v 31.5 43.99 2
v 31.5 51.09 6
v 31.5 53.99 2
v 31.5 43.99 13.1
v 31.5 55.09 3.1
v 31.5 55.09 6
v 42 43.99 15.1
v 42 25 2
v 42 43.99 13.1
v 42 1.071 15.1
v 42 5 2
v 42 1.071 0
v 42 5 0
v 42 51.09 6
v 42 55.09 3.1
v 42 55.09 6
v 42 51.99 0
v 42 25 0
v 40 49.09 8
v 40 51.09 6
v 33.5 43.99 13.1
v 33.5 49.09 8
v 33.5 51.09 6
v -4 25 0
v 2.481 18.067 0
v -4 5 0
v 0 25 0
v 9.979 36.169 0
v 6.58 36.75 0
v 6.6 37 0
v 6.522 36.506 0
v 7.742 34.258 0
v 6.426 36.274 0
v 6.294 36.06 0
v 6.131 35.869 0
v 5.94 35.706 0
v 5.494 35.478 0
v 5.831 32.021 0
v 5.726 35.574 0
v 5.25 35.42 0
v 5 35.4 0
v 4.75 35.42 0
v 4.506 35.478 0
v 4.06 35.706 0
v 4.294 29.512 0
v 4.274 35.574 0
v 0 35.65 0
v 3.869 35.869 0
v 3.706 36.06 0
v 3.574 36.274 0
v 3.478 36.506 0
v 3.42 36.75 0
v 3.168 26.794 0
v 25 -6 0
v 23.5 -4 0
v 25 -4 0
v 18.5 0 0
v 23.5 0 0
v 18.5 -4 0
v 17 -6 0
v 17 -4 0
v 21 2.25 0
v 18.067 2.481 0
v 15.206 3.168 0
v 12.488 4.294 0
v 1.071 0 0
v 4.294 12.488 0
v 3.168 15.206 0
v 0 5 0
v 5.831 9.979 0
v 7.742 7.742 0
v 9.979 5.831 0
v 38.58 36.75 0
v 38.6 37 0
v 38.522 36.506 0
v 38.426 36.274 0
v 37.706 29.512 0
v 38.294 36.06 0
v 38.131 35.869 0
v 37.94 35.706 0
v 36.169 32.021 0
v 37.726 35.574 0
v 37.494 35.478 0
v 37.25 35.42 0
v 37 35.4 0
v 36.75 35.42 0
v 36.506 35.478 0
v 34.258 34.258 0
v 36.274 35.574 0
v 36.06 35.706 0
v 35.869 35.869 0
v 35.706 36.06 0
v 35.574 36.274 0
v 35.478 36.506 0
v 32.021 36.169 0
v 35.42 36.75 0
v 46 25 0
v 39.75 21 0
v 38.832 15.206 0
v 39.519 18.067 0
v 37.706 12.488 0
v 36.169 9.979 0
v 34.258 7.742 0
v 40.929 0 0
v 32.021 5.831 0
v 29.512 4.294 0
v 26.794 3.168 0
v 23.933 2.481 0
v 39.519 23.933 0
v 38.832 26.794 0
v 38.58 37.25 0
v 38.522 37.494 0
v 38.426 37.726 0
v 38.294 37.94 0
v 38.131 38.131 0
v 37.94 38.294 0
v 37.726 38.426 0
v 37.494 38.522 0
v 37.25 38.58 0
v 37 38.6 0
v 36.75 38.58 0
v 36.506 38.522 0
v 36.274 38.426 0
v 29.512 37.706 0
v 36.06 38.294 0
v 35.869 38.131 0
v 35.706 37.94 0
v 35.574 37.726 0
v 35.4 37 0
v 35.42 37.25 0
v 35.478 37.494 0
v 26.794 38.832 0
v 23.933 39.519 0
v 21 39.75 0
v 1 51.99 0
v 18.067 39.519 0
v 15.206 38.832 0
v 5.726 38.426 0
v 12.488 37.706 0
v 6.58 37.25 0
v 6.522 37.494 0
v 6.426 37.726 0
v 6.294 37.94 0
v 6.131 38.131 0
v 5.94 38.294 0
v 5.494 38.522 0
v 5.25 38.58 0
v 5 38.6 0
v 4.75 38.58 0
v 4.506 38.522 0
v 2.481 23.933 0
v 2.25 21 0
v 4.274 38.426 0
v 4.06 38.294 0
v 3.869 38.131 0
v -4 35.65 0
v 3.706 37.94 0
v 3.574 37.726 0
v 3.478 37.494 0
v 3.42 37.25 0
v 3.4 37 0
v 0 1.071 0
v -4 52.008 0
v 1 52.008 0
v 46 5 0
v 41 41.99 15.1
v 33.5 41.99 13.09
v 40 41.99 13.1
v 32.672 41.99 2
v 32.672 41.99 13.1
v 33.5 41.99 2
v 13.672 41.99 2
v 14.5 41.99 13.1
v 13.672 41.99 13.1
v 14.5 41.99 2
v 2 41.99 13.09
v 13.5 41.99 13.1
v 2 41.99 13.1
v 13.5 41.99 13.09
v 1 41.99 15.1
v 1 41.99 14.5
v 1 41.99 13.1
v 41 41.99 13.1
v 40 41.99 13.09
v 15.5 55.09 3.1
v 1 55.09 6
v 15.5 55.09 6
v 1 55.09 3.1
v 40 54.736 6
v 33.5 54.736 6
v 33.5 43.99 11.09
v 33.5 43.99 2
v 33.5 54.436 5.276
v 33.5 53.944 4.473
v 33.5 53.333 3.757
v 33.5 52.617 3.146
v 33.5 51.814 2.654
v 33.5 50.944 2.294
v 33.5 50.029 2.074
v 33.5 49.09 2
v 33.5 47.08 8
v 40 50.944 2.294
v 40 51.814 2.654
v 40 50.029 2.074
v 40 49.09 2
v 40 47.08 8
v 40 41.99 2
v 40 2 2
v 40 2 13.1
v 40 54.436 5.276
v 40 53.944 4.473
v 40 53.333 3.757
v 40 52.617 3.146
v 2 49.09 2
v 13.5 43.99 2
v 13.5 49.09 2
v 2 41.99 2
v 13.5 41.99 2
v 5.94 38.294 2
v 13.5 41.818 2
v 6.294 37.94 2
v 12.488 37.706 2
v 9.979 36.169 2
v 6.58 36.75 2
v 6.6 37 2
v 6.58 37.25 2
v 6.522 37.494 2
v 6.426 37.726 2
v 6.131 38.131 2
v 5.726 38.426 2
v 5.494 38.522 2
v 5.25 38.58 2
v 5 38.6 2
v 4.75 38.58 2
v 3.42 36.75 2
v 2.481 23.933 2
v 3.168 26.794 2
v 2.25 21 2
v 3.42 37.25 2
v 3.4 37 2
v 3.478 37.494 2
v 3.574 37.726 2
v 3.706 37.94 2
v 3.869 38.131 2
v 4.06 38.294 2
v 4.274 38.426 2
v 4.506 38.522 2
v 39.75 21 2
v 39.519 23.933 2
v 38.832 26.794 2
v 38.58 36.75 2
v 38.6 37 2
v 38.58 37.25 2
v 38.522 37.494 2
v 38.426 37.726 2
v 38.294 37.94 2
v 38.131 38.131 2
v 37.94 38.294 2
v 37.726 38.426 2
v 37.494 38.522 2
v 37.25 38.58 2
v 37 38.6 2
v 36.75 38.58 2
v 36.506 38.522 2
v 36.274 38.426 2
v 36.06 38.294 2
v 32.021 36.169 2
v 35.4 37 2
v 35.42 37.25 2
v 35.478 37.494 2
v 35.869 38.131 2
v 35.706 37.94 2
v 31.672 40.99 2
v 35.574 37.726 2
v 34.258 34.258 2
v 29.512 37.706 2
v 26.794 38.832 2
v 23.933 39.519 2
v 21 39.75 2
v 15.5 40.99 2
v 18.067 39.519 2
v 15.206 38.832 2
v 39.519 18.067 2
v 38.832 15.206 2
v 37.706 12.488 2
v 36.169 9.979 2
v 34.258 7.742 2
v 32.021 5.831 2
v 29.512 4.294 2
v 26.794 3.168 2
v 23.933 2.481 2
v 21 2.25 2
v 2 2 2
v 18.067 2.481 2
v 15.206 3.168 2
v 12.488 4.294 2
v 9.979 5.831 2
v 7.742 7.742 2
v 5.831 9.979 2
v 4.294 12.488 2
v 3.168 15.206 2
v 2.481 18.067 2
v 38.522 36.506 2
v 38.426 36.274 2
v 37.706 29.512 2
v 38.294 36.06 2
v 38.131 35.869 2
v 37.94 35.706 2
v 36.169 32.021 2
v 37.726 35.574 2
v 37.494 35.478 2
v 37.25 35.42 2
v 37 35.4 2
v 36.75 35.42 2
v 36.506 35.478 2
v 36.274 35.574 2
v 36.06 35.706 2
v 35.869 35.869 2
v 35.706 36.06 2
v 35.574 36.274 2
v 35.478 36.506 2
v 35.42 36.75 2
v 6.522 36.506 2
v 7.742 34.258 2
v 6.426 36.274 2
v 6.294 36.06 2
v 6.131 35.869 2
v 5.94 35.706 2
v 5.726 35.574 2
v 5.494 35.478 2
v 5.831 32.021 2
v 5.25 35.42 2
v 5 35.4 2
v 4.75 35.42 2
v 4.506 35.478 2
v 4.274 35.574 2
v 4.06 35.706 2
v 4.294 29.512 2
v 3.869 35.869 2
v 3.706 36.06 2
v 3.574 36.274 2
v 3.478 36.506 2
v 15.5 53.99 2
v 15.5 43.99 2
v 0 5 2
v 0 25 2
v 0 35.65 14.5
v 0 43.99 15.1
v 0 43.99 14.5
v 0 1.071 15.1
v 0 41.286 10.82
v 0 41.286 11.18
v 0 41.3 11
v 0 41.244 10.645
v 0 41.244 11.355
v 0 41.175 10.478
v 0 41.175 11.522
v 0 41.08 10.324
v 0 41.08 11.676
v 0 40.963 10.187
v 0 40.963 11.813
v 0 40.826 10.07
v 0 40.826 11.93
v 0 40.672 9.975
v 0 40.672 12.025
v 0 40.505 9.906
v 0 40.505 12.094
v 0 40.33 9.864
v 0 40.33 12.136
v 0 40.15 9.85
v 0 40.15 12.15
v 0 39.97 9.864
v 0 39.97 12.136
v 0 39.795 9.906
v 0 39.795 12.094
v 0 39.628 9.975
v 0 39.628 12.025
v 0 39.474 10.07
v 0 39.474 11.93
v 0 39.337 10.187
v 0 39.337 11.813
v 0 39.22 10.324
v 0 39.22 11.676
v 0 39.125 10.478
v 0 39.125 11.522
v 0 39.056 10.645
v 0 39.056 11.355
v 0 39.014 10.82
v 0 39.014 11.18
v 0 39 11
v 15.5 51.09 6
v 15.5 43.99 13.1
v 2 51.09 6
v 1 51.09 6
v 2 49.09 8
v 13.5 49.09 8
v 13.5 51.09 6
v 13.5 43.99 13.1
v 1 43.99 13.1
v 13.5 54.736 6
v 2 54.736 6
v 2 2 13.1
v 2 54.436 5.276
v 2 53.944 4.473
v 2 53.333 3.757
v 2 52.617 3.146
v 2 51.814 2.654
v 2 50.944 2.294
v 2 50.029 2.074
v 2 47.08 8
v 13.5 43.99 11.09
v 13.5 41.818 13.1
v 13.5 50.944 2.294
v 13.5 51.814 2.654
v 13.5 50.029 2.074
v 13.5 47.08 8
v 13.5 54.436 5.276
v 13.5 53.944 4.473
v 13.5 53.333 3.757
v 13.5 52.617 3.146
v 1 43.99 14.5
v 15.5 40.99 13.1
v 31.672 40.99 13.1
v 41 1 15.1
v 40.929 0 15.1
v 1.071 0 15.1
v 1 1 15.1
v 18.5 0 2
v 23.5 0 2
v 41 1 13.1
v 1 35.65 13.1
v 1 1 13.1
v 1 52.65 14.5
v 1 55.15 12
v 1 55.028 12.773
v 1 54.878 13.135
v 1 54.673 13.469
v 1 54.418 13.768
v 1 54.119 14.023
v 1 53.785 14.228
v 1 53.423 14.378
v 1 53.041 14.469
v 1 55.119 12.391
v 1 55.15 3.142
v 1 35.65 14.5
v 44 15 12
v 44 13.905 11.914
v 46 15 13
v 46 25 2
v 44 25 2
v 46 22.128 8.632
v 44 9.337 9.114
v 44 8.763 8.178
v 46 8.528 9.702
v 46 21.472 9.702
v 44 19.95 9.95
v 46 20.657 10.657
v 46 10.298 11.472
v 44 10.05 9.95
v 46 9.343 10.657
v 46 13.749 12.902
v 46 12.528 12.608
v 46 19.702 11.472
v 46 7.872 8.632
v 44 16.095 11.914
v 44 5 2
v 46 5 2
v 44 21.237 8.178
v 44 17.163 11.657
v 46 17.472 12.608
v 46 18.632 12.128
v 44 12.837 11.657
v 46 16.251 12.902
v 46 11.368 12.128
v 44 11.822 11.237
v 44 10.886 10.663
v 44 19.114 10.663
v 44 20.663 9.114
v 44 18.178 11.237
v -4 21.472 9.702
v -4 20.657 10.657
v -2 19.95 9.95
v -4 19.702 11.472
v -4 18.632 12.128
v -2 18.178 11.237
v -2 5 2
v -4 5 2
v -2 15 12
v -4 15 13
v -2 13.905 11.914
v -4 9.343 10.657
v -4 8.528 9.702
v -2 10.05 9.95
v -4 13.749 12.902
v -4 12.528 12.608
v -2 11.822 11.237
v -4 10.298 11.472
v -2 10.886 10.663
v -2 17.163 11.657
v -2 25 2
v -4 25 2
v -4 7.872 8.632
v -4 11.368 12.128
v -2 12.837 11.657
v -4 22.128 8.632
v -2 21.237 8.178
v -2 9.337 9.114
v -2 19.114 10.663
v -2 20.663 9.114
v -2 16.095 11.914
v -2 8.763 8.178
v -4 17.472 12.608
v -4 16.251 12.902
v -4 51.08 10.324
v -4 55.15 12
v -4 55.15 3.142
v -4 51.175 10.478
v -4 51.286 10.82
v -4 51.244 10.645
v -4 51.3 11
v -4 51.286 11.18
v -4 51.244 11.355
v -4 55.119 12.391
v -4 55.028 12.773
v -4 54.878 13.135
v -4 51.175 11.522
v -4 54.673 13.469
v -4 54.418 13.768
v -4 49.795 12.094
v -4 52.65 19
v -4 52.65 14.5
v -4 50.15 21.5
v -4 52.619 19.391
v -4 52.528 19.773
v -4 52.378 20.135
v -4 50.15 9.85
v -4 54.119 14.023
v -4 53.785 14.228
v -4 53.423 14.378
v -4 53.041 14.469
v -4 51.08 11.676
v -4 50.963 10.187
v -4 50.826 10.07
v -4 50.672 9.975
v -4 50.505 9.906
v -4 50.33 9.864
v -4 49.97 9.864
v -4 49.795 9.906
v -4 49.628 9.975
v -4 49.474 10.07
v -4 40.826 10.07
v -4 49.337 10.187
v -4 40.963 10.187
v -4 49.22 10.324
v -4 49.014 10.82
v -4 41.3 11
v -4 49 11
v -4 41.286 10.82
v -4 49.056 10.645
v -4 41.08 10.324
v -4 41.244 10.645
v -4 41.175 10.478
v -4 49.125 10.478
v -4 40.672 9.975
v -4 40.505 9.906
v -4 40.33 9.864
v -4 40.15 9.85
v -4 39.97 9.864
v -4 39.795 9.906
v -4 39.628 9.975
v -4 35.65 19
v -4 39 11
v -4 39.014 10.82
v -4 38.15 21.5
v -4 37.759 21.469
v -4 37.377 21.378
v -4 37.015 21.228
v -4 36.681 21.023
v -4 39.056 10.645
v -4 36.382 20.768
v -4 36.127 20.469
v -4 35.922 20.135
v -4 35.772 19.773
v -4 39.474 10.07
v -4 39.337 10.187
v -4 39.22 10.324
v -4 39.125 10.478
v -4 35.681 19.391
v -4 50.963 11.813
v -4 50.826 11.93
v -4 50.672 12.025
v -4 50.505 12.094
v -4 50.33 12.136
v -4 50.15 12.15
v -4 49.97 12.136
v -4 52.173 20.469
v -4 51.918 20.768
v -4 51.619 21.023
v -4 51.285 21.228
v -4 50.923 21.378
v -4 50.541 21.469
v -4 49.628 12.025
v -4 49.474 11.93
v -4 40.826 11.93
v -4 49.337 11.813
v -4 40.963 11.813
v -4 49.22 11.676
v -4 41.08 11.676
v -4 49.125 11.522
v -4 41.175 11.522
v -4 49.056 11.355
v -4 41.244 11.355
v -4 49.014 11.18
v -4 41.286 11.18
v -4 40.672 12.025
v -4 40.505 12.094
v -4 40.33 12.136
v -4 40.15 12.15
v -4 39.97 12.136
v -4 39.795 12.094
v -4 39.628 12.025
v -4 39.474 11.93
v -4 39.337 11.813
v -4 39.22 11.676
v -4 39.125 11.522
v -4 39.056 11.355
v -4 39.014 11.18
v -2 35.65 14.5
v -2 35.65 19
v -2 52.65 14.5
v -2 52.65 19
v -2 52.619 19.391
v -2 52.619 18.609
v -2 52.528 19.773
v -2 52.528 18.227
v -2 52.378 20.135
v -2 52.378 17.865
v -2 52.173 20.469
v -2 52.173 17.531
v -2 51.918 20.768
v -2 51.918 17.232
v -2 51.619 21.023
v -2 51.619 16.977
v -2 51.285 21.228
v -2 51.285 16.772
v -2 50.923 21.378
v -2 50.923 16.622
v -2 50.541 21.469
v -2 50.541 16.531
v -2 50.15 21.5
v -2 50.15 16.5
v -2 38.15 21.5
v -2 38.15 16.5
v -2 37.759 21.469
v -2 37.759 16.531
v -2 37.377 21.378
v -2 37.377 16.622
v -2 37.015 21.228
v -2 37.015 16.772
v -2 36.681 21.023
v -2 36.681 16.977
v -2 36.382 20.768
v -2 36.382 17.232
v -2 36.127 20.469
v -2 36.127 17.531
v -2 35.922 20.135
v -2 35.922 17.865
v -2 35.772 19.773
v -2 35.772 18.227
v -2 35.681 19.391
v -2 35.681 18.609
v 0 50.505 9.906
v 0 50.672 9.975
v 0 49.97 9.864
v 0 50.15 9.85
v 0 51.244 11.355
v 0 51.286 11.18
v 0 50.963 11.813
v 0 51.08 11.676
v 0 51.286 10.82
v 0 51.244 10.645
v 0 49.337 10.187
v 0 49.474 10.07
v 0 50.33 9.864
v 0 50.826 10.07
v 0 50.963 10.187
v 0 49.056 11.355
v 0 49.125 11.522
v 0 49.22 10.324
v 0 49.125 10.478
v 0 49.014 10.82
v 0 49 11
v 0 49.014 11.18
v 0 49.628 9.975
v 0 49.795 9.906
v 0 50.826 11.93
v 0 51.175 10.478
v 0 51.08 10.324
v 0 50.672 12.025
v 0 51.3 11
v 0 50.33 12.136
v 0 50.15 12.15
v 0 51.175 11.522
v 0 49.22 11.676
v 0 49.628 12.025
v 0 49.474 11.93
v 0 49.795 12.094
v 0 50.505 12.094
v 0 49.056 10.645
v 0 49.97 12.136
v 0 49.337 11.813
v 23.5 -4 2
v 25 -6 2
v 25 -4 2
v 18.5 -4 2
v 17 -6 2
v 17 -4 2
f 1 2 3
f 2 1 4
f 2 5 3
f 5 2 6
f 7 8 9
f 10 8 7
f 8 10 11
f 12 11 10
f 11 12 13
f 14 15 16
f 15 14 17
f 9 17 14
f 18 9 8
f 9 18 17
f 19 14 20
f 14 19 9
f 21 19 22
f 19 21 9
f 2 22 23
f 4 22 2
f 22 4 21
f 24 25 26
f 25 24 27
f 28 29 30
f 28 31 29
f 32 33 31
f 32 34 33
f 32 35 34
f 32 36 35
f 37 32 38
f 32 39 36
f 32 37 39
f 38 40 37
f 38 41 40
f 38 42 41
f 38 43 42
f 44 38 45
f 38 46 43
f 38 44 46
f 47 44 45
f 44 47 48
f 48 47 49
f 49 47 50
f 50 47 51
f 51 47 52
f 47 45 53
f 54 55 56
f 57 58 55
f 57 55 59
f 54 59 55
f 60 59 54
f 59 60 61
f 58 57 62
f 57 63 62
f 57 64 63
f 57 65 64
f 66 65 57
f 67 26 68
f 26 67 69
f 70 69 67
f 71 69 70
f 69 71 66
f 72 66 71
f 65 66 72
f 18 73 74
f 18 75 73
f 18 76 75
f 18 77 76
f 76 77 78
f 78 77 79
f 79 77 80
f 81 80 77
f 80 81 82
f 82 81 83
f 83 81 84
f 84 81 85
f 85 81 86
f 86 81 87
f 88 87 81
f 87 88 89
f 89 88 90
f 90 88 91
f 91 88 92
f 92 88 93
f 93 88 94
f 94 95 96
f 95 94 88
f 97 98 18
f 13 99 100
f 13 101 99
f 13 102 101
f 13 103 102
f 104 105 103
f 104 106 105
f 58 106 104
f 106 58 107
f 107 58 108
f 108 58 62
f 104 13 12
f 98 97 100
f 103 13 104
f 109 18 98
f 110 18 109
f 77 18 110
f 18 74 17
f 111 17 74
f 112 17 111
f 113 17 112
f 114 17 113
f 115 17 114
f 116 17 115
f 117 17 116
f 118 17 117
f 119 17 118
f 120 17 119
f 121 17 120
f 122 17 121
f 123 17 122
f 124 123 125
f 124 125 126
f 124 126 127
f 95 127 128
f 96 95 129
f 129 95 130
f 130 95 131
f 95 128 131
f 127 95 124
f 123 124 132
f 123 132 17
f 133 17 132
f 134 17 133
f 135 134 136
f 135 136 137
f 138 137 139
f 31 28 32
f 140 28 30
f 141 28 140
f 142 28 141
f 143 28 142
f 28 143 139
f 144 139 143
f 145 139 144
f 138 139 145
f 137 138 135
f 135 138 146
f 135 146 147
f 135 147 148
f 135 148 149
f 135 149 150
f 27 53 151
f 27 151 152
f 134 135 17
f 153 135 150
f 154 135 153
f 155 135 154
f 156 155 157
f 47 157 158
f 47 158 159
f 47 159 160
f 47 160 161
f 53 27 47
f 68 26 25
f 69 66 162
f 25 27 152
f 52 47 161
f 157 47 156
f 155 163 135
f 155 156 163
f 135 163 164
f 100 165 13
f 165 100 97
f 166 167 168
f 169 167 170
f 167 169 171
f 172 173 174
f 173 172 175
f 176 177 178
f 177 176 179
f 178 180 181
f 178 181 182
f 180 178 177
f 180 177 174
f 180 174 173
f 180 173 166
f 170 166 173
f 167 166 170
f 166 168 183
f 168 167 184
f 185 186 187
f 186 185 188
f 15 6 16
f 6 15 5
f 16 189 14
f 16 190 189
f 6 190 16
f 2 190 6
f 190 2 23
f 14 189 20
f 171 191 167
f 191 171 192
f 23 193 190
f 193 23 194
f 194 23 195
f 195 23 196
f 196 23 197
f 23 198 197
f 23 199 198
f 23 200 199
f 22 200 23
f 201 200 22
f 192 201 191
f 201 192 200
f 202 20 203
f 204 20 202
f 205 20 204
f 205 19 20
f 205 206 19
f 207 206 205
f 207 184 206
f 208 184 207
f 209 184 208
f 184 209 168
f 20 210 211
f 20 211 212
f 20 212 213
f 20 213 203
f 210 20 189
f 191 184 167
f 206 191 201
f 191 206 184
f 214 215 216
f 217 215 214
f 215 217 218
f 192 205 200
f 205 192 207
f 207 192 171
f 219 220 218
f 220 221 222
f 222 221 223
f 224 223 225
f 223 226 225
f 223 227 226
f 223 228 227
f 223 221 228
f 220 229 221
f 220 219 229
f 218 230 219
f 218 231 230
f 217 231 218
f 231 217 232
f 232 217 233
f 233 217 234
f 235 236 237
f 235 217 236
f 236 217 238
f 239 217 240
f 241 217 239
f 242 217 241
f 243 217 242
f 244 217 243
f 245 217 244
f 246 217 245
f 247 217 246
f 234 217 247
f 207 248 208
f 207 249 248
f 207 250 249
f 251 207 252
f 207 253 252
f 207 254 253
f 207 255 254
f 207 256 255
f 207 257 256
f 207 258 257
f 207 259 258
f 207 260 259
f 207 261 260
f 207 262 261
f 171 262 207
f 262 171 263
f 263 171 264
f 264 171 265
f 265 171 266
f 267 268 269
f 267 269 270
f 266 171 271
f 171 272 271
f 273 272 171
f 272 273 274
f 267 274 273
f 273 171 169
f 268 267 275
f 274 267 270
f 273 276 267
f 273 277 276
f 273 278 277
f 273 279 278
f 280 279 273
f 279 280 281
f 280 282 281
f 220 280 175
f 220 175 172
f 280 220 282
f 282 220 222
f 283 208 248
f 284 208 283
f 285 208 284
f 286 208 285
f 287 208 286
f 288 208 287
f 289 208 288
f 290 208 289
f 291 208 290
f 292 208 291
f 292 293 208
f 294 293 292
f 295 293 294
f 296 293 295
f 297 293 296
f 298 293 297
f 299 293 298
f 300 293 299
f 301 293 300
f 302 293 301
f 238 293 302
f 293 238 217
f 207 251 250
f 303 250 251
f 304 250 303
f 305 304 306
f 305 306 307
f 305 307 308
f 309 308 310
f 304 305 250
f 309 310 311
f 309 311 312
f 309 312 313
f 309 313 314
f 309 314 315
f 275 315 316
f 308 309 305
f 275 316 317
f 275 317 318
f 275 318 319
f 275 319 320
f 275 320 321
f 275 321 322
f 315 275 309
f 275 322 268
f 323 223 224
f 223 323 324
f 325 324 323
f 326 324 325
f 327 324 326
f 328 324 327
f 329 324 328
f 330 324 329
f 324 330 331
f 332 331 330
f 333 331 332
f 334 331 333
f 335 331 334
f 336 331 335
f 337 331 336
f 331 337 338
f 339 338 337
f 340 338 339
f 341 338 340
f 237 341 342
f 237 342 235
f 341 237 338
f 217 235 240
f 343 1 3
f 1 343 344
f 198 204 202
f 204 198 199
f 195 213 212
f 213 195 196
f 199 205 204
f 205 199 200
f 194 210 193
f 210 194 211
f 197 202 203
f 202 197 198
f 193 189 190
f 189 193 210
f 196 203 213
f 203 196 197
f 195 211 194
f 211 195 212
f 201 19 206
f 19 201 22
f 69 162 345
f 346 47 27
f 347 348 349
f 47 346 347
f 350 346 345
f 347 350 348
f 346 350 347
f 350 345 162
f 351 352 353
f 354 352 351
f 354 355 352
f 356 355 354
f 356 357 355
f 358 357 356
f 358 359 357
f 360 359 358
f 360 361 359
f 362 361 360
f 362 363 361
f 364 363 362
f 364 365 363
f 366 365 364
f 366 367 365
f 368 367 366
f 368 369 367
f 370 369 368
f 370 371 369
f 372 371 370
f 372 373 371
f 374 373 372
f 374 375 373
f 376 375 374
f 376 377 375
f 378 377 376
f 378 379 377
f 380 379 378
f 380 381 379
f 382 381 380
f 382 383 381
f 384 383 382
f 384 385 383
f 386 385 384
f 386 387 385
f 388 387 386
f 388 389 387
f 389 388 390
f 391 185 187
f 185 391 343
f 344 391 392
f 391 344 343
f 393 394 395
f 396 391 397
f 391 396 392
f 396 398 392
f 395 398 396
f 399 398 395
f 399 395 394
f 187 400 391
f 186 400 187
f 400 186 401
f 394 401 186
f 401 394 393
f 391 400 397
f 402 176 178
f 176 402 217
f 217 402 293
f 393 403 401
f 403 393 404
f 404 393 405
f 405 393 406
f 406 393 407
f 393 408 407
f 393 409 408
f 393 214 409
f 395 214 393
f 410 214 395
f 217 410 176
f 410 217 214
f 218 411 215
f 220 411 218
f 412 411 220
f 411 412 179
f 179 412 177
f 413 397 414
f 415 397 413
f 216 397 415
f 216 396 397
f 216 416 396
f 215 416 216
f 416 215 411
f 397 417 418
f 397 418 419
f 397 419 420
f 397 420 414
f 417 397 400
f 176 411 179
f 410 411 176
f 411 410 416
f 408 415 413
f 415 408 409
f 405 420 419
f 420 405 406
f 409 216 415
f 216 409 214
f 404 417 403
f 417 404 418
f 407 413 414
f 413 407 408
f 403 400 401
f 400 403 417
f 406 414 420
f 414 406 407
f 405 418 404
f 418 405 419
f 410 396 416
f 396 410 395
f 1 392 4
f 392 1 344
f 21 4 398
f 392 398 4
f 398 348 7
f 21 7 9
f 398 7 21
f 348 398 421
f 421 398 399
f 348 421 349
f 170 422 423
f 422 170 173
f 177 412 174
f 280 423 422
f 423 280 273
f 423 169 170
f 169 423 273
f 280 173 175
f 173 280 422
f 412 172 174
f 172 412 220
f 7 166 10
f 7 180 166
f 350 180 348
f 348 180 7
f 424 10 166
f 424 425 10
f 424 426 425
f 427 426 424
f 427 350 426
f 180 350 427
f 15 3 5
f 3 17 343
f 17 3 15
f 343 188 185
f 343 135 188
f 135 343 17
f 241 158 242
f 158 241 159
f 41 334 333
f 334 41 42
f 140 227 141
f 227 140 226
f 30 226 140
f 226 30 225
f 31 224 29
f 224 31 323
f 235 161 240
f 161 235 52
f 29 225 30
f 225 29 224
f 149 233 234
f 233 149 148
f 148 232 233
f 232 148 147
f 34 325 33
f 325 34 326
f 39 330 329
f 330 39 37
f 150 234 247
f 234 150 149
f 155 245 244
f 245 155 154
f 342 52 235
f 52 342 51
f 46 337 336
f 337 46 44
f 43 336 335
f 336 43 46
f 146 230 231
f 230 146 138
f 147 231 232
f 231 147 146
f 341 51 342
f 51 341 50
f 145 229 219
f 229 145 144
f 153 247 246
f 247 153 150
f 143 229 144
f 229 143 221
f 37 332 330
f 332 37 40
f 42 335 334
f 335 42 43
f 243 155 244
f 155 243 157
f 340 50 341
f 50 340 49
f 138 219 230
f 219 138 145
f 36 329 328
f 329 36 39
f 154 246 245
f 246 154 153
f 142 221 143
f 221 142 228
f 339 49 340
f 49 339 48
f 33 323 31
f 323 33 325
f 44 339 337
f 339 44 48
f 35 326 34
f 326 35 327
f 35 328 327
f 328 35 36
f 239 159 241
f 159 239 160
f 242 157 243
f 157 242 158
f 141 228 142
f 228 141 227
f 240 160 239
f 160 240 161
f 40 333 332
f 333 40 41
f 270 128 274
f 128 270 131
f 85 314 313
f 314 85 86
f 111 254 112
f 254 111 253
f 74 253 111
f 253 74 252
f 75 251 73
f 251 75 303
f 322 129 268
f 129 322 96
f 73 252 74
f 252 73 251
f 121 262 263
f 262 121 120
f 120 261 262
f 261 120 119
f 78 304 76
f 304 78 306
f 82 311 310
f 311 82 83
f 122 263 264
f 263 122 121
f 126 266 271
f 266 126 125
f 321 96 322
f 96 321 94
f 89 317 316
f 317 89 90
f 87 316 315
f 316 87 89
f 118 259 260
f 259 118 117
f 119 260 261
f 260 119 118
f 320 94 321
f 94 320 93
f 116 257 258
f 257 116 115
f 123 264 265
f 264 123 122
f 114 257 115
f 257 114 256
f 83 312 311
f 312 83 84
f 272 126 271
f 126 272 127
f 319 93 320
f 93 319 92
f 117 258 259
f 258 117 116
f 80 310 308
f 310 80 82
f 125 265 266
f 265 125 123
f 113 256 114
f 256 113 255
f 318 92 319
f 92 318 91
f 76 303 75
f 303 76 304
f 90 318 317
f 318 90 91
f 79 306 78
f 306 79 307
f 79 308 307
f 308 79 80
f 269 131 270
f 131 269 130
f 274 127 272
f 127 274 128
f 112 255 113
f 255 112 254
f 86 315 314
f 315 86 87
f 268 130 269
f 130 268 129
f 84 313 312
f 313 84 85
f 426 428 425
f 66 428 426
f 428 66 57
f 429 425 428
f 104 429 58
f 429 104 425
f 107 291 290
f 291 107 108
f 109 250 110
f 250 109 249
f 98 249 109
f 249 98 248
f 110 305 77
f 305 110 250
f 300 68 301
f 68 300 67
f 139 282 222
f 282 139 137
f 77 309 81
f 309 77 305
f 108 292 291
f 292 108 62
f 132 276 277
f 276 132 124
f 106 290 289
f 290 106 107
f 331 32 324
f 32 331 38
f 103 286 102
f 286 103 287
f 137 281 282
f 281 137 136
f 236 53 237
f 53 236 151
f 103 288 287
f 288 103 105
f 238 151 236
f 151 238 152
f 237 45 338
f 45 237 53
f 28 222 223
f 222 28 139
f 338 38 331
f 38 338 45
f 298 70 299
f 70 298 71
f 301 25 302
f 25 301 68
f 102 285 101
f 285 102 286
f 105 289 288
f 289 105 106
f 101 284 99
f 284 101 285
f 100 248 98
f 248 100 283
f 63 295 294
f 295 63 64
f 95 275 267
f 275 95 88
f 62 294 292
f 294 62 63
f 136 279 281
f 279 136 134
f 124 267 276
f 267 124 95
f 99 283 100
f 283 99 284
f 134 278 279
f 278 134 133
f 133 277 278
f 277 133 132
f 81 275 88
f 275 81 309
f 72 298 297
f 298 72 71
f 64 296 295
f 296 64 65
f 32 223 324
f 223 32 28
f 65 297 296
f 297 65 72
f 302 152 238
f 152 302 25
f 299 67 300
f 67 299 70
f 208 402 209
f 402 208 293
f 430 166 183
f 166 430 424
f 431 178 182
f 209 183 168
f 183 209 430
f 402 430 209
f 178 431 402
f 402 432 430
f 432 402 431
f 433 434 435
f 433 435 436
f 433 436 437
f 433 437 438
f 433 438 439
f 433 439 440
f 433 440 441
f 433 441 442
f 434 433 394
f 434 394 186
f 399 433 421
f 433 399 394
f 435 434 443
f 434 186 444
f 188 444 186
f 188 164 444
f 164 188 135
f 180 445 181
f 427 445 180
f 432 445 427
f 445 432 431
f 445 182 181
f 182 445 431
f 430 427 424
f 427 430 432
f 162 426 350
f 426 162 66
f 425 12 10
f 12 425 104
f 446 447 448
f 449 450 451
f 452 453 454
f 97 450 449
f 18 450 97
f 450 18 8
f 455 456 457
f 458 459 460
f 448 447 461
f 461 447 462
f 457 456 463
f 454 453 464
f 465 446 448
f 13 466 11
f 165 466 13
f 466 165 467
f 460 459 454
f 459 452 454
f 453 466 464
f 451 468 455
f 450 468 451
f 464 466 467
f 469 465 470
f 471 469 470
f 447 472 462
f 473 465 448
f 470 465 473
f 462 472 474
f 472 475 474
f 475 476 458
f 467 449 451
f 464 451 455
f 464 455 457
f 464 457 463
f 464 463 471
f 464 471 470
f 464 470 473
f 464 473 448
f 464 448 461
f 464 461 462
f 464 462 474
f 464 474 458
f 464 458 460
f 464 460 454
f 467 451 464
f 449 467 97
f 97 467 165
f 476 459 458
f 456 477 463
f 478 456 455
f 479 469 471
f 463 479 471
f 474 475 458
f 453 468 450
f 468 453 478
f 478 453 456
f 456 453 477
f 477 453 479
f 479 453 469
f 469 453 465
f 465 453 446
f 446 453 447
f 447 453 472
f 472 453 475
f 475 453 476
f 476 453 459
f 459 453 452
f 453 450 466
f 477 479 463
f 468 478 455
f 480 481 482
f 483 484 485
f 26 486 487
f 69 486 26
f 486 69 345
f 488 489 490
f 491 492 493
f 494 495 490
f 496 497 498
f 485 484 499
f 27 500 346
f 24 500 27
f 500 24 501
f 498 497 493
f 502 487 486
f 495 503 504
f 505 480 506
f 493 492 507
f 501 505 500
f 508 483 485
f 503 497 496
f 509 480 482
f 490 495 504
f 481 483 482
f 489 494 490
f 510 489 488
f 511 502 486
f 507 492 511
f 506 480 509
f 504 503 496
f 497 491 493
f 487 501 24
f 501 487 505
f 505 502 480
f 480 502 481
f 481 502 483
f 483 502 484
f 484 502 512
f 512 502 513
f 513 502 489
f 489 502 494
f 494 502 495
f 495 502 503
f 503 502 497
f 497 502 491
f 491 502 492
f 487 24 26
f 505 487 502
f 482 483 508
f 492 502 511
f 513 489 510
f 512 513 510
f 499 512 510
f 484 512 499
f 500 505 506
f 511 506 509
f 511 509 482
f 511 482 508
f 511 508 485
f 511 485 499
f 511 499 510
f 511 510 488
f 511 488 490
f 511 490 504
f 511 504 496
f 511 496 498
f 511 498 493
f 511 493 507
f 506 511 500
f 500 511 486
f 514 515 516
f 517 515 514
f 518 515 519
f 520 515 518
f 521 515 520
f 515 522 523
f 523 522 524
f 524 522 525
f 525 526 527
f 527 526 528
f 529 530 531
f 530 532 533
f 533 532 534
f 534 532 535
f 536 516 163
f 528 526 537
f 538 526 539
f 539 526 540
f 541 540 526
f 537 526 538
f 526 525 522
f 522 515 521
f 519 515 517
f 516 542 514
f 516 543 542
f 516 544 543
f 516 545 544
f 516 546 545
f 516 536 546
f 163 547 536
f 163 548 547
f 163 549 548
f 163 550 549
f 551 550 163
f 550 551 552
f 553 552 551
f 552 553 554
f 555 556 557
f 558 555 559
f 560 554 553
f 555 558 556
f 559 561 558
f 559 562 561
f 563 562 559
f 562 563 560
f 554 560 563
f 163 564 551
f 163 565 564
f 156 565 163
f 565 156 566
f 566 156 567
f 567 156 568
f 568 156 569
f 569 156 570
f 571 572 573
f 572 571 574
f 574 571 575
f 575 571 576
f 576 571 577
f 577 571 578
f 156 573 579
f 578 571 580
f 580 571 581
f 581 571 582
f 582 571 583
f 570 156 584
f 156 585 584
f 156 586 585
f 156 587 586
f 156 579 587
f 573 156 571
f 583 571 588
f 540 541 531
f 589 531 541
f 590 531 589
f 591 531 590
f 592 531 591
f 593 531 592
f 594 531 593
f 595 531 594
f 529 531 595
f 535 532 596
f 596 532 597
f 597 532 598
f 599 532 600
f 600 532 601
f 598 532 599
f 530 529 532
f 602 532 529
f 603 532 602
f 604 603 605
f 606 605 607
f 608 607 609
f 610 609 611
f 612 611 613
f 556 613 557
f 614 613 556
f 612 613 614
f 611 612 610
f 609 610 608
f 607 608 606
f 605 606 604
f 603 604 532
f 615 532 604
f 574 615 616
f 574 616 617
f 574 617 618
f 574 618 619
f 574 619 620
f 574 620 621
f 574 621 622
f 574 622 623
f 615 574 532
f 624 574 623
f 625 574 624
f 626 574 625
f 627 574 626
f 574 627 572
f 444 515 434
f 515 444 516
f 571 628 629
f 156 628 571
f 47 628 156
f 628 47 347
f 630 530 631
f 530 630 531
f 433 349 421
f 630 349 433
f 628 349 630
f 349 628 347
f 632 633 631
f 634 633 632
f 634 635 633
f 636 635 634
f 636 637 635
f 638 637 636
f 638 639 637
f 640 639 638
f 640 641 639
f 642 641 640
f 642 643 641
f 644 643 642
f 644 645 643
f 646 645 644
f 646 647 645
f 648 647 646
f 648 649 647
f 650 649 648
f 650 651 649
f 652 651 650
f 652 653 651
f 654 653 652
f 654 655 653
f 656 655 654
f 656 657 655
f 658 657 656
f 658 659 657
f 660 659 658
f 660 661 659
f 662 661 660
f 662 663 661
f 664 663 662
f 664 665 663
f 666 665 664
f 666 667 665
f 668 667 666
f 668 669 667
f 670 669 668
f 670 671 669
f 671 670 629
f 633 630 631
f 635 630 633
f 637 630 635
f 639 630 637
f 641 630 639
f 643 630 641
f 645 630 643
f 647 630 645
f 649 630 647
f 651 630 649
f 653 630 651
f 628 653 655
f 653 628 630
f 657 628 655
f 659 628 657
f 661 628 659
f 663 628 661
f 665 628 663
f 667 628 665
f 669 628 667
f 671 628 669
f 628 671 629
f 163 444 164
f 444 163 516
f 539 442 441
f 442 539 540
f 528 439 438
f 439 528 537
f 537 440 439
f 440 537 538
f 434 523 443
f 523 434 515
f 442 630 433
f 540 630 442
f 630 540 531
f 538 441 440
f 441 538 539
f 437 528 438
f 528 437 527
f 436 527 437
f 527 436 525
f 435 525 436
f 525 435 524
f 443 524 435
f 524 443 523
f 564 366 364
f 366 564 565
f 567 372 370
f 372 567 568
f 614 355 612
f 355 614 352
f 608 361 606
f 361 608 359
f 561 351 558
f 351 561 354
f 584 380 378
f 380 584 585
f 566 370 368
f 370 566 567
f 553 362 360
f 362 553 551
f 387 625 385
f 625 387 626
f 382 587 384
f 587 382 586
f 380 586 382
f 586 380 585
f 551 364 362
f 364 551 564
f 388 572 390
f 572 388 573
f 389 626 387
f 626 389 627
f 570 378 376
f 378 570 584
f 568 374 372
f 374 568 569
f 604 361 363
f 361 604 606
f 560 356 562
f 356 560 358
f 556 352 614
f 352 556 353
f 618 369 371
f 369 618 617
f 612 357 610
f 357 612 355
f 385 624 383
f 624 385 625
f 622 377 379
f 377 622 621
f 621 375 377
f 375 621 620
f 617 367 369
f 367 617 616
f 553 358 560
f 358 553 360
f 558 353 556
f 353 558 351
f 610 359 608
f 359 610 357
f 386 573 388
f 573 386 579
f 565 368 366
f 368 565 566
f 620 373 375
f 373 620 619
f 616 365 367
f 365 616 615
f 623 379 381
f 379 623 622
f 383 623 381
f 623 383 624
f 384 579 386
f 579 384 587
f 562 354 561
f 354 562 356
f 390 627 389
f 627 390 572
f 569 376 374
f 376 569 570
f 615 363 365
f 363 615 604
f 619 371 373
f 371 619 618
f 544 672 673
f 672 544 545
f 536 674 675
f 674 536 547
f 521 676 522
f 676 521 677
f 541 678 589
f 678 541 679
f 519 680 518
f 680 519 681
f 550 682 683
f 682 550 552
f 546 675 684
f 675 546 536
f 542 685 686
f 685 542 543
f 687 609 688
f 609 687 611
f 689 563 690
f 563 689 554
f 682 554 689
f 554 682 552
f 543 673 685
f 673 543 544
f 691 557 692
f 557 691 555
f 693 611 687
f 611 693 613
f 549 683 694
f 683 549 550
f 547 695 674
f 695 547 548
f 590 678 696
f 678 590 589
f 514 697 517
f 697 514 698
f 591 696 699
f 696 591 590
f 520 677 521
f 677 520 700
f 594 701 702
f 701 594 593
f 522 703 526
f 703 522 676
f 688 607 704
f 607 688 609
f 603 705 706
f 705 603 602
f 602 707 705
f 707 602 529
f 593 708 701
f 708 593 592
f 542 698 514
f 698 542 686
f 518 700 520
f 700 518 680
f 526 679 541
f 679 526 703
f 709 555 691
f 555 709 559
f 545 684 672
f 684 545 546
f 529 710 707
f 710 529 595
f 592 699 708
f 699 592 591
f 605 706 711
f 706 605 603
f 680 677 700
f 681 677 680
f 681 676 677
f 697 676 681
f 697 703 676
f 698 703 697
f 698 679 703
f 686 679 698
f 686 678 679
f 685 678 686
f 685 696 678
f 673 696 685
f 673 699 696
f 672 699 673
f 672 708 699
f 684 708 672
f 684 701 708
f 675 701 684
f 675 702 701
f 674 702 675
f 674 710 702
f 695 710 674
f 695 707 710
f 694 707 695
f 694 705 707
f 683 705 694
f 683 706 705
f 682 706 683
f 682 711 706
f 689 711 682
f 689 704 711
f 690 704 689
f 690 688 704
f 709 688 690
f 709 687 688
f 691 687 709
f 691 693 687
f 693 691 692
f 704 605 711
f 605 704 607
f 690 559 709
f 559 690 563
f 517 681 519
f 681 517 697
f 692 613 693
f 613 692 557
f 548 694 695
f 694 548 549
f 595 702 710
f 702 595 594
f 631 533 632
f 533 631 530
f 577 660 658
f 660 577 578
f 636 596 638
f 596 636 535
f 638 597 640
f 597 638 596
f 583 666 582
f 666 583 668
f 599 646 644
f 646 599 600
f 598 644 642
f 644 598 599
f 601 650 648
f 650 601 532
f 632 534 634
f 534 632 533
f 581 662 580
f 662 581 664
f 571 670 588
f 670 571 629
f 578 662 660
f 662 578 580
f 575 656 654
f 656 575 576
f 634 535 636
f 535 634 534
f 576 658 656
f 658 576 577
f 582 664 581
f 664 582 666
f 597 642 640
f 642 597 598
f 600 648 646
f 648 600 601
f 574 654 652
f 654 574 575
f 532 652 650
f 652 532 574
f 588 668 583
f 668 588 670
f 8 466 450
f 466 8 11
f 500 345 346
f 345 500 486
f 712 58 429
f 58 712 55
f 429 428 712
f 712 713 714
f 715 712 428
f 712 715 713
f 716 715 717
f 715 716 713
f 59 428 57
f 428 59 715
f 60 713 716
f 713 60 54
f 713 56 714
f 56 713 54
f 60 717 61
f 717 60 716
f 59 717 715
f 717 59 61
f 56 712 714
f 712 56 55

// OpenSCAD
$fn=40;
//hotend duct 
sc = 32; //Screw Centres
wall=2;
hole = 37.5;  //fan hole
x=42;
y=x;
z=15.10;
heo = 2.5; //hot end offset
hbr = 16; //heat block recess

ventB=(x/2)-(hbr/2)+heo;
ventS=(x/2)-(hbr/2)-heo;

module prism(l, w, h) {
	translate([0, l, 0]) rotate( a= [90, 0, 0]) 
	linear_extrude(height = l) polygon(points = [
		[0, 0],
		[w, 0],
		[0, h]
	], paths=[[0,2,1]]);
}

module vHole(len) {
	difference() {
		union() {
			cube([10-6,len,6]);
			translate([10-6,len,6]) rotate([90,0,0]) cylinder(len,6,6);
		}
		translate ([-7,-1,6]) cube([16,len+2,10]);
		translate ([-7,-1,0]) cube([6,len+2,7]);
	}
}

module irsensor_mount() {
	difference() {
		union() {
		difference() {
			cube([5,19.5,19]); //main block
			translate([-1,17,12]) cube([7,3.5,8]); //end gap
			translate([2,-1,14.5]) cube([4,19.5,8]); //back gap
			translate([-2,20.5,-10]) rotate([45,0,0]) cube(10); //match vent bevel
		}
		translate([0,17,12]) rotate([0,90,0]) cylinder(5,2.5,2.5); //rounded end
		}
		translate([-1,4.5,11]) rotate([0,90,0]) cylinder(5,1.15,1.15); //screw hole L
		translate([-1,14.5,11]) rotate([0,90,0]) cylinder(5,1.15,1.15); //screw hole R
	}
	
	hull() { //rounded top
		translate([0,2.5,19]) rotate([0,90,0]) cylinder(2,2.5,2.5);
		translate([0,14.5,19]) rotate([0,90,0]) cylinder(2,2.5,2.5);
	}
}

//Vents
translate([x,y-0.01,0]) rotate([0,0,90]) {
difference() {
	union() {
	difference() {
		union() {
			prism(ventS,z,z);
			translate([z-6,0,0]) cube([4,ventS,6]);
		}
		difference() {
			translate([-.01,wall,wall]) prism(ventS-(wall*2),z-(wall*2),z-(wall*2));
			translate([6,0,0]) cube([6,ventS,6]);
		}
		
		translate([z-12,wall,wall]) vHole(ventS-(wall*2));
	}

	translate([0,ventS+hbr,0]) { //Small Vent
		difference() { //Big Vent
			union() {
				prism(ventB,z,z);
				translate([z-6,0,0]) cube([4,ventB,6]);
			}
			difference() {
				translate([-.01,wall,wall]) prism(ventB-(wall*2),z-(wall*2),z-(wall*2));
				translate([6,0,0]) cube([6,ventB,6]);
			}
			translate([z-12,wall,wall]) vHole(ventB-(wall*2));
		}
	}
	cube([z-2,y,wall]); //Base
	translate([0,0,z-wall]) cube([wall,y,wall]); //top of slope edging strip
	difference() {
		translate([-wall/2,ventS-wall,wall]) cube([wall+1,hbr+(wall*2),z-(wall*2)]); //vent join

		translate([-1,ventS-3,wall]) rotate([0,0,45]) cube([wall,wall,z-(wall*2)]); //vent join bevel
		translate([-1,hbr+ventS,wall]) rotate([0,0,45]) cube([wall,wall,z-(wall*2)]); //vent join bevel
	}
	}
	translate([10,-1,0]) rotate([0,45,0]) cube([10,y+2,10]); //vent bevel
}

}

//Body
difference() {
	cube([x,y,z]); //outer block
	translate([x/2,x/2,-.1]) cylinder(20,hole/2,hole/2); //fan hole
	translate([wall,wall,2]) cube([x-(wall*2), x, 20]); //heatsink hole
	translate([wall-1,wall-1,z-2]) cube([x-(wall), x, 20]); //heatsink recess
	
	for(xp = [0:1]) { //4 x screw holes
		for(yp = [1:1]) { // dont need 4 screw holes so changed [0:1] to [1:1]
			//hull() { //hull to make slots
			translate([((x-sc)/2) + (xp*sc),((x-sc)/2) + (yp*sc),-.1]) cylinder(3,1.6,1.6);
			//translate([((x-sc)/2) + (xp*sc),((x-sc)/2) + (yp*sc)+2,-.1]) cylinder(3,1.5,1.5);
			//}
		}
	}
	translate([0,-6,-1]) rotate([0,0,45]) cube([5,5,z+2]);
	translate([x,-6,-1]) rotate([0,0,45]) cube([5,5,z+2]);
}


//Cable Traps
translate([x,5,0]) cube([wall*2,20,2]); //right cable trap
	difference() {
	hull() {
		translate([x+wall,5+10,5]) rotate([0,90,0]) cylinder(wall,7,8); //right cable trap
		translate([x+wall,5,0]) cube([wall,20,2]); //right cable trap
	}
	translate([x+wall-.1,5,-10]) cube([wall+.2,20,10]); //remove bottom cylinder
}

translate([-wall*2,5,0]) cube([wall*2,20,2]); //left cable trap
	difference() {
	hull() {
		translate([-wall*2,5+10,5]) rotate([0,90,0]) cylinder(wall,8,7); 
		translate([-wall*2,5,0]) cube([wall,20,2]); 
	}
	translate([-(wall*2)-.1,5,-10]) cube([wall+.2,20,10]); //remove bottom cylinder
}

//Tie Wrap T
translate([x/2-2.5,-6,0]) cube([5,6,2]);
translate([x/2-4,-6,0]) cube([8,2,2]);

translate([-4,35.65,0]) irsensor_mount();
